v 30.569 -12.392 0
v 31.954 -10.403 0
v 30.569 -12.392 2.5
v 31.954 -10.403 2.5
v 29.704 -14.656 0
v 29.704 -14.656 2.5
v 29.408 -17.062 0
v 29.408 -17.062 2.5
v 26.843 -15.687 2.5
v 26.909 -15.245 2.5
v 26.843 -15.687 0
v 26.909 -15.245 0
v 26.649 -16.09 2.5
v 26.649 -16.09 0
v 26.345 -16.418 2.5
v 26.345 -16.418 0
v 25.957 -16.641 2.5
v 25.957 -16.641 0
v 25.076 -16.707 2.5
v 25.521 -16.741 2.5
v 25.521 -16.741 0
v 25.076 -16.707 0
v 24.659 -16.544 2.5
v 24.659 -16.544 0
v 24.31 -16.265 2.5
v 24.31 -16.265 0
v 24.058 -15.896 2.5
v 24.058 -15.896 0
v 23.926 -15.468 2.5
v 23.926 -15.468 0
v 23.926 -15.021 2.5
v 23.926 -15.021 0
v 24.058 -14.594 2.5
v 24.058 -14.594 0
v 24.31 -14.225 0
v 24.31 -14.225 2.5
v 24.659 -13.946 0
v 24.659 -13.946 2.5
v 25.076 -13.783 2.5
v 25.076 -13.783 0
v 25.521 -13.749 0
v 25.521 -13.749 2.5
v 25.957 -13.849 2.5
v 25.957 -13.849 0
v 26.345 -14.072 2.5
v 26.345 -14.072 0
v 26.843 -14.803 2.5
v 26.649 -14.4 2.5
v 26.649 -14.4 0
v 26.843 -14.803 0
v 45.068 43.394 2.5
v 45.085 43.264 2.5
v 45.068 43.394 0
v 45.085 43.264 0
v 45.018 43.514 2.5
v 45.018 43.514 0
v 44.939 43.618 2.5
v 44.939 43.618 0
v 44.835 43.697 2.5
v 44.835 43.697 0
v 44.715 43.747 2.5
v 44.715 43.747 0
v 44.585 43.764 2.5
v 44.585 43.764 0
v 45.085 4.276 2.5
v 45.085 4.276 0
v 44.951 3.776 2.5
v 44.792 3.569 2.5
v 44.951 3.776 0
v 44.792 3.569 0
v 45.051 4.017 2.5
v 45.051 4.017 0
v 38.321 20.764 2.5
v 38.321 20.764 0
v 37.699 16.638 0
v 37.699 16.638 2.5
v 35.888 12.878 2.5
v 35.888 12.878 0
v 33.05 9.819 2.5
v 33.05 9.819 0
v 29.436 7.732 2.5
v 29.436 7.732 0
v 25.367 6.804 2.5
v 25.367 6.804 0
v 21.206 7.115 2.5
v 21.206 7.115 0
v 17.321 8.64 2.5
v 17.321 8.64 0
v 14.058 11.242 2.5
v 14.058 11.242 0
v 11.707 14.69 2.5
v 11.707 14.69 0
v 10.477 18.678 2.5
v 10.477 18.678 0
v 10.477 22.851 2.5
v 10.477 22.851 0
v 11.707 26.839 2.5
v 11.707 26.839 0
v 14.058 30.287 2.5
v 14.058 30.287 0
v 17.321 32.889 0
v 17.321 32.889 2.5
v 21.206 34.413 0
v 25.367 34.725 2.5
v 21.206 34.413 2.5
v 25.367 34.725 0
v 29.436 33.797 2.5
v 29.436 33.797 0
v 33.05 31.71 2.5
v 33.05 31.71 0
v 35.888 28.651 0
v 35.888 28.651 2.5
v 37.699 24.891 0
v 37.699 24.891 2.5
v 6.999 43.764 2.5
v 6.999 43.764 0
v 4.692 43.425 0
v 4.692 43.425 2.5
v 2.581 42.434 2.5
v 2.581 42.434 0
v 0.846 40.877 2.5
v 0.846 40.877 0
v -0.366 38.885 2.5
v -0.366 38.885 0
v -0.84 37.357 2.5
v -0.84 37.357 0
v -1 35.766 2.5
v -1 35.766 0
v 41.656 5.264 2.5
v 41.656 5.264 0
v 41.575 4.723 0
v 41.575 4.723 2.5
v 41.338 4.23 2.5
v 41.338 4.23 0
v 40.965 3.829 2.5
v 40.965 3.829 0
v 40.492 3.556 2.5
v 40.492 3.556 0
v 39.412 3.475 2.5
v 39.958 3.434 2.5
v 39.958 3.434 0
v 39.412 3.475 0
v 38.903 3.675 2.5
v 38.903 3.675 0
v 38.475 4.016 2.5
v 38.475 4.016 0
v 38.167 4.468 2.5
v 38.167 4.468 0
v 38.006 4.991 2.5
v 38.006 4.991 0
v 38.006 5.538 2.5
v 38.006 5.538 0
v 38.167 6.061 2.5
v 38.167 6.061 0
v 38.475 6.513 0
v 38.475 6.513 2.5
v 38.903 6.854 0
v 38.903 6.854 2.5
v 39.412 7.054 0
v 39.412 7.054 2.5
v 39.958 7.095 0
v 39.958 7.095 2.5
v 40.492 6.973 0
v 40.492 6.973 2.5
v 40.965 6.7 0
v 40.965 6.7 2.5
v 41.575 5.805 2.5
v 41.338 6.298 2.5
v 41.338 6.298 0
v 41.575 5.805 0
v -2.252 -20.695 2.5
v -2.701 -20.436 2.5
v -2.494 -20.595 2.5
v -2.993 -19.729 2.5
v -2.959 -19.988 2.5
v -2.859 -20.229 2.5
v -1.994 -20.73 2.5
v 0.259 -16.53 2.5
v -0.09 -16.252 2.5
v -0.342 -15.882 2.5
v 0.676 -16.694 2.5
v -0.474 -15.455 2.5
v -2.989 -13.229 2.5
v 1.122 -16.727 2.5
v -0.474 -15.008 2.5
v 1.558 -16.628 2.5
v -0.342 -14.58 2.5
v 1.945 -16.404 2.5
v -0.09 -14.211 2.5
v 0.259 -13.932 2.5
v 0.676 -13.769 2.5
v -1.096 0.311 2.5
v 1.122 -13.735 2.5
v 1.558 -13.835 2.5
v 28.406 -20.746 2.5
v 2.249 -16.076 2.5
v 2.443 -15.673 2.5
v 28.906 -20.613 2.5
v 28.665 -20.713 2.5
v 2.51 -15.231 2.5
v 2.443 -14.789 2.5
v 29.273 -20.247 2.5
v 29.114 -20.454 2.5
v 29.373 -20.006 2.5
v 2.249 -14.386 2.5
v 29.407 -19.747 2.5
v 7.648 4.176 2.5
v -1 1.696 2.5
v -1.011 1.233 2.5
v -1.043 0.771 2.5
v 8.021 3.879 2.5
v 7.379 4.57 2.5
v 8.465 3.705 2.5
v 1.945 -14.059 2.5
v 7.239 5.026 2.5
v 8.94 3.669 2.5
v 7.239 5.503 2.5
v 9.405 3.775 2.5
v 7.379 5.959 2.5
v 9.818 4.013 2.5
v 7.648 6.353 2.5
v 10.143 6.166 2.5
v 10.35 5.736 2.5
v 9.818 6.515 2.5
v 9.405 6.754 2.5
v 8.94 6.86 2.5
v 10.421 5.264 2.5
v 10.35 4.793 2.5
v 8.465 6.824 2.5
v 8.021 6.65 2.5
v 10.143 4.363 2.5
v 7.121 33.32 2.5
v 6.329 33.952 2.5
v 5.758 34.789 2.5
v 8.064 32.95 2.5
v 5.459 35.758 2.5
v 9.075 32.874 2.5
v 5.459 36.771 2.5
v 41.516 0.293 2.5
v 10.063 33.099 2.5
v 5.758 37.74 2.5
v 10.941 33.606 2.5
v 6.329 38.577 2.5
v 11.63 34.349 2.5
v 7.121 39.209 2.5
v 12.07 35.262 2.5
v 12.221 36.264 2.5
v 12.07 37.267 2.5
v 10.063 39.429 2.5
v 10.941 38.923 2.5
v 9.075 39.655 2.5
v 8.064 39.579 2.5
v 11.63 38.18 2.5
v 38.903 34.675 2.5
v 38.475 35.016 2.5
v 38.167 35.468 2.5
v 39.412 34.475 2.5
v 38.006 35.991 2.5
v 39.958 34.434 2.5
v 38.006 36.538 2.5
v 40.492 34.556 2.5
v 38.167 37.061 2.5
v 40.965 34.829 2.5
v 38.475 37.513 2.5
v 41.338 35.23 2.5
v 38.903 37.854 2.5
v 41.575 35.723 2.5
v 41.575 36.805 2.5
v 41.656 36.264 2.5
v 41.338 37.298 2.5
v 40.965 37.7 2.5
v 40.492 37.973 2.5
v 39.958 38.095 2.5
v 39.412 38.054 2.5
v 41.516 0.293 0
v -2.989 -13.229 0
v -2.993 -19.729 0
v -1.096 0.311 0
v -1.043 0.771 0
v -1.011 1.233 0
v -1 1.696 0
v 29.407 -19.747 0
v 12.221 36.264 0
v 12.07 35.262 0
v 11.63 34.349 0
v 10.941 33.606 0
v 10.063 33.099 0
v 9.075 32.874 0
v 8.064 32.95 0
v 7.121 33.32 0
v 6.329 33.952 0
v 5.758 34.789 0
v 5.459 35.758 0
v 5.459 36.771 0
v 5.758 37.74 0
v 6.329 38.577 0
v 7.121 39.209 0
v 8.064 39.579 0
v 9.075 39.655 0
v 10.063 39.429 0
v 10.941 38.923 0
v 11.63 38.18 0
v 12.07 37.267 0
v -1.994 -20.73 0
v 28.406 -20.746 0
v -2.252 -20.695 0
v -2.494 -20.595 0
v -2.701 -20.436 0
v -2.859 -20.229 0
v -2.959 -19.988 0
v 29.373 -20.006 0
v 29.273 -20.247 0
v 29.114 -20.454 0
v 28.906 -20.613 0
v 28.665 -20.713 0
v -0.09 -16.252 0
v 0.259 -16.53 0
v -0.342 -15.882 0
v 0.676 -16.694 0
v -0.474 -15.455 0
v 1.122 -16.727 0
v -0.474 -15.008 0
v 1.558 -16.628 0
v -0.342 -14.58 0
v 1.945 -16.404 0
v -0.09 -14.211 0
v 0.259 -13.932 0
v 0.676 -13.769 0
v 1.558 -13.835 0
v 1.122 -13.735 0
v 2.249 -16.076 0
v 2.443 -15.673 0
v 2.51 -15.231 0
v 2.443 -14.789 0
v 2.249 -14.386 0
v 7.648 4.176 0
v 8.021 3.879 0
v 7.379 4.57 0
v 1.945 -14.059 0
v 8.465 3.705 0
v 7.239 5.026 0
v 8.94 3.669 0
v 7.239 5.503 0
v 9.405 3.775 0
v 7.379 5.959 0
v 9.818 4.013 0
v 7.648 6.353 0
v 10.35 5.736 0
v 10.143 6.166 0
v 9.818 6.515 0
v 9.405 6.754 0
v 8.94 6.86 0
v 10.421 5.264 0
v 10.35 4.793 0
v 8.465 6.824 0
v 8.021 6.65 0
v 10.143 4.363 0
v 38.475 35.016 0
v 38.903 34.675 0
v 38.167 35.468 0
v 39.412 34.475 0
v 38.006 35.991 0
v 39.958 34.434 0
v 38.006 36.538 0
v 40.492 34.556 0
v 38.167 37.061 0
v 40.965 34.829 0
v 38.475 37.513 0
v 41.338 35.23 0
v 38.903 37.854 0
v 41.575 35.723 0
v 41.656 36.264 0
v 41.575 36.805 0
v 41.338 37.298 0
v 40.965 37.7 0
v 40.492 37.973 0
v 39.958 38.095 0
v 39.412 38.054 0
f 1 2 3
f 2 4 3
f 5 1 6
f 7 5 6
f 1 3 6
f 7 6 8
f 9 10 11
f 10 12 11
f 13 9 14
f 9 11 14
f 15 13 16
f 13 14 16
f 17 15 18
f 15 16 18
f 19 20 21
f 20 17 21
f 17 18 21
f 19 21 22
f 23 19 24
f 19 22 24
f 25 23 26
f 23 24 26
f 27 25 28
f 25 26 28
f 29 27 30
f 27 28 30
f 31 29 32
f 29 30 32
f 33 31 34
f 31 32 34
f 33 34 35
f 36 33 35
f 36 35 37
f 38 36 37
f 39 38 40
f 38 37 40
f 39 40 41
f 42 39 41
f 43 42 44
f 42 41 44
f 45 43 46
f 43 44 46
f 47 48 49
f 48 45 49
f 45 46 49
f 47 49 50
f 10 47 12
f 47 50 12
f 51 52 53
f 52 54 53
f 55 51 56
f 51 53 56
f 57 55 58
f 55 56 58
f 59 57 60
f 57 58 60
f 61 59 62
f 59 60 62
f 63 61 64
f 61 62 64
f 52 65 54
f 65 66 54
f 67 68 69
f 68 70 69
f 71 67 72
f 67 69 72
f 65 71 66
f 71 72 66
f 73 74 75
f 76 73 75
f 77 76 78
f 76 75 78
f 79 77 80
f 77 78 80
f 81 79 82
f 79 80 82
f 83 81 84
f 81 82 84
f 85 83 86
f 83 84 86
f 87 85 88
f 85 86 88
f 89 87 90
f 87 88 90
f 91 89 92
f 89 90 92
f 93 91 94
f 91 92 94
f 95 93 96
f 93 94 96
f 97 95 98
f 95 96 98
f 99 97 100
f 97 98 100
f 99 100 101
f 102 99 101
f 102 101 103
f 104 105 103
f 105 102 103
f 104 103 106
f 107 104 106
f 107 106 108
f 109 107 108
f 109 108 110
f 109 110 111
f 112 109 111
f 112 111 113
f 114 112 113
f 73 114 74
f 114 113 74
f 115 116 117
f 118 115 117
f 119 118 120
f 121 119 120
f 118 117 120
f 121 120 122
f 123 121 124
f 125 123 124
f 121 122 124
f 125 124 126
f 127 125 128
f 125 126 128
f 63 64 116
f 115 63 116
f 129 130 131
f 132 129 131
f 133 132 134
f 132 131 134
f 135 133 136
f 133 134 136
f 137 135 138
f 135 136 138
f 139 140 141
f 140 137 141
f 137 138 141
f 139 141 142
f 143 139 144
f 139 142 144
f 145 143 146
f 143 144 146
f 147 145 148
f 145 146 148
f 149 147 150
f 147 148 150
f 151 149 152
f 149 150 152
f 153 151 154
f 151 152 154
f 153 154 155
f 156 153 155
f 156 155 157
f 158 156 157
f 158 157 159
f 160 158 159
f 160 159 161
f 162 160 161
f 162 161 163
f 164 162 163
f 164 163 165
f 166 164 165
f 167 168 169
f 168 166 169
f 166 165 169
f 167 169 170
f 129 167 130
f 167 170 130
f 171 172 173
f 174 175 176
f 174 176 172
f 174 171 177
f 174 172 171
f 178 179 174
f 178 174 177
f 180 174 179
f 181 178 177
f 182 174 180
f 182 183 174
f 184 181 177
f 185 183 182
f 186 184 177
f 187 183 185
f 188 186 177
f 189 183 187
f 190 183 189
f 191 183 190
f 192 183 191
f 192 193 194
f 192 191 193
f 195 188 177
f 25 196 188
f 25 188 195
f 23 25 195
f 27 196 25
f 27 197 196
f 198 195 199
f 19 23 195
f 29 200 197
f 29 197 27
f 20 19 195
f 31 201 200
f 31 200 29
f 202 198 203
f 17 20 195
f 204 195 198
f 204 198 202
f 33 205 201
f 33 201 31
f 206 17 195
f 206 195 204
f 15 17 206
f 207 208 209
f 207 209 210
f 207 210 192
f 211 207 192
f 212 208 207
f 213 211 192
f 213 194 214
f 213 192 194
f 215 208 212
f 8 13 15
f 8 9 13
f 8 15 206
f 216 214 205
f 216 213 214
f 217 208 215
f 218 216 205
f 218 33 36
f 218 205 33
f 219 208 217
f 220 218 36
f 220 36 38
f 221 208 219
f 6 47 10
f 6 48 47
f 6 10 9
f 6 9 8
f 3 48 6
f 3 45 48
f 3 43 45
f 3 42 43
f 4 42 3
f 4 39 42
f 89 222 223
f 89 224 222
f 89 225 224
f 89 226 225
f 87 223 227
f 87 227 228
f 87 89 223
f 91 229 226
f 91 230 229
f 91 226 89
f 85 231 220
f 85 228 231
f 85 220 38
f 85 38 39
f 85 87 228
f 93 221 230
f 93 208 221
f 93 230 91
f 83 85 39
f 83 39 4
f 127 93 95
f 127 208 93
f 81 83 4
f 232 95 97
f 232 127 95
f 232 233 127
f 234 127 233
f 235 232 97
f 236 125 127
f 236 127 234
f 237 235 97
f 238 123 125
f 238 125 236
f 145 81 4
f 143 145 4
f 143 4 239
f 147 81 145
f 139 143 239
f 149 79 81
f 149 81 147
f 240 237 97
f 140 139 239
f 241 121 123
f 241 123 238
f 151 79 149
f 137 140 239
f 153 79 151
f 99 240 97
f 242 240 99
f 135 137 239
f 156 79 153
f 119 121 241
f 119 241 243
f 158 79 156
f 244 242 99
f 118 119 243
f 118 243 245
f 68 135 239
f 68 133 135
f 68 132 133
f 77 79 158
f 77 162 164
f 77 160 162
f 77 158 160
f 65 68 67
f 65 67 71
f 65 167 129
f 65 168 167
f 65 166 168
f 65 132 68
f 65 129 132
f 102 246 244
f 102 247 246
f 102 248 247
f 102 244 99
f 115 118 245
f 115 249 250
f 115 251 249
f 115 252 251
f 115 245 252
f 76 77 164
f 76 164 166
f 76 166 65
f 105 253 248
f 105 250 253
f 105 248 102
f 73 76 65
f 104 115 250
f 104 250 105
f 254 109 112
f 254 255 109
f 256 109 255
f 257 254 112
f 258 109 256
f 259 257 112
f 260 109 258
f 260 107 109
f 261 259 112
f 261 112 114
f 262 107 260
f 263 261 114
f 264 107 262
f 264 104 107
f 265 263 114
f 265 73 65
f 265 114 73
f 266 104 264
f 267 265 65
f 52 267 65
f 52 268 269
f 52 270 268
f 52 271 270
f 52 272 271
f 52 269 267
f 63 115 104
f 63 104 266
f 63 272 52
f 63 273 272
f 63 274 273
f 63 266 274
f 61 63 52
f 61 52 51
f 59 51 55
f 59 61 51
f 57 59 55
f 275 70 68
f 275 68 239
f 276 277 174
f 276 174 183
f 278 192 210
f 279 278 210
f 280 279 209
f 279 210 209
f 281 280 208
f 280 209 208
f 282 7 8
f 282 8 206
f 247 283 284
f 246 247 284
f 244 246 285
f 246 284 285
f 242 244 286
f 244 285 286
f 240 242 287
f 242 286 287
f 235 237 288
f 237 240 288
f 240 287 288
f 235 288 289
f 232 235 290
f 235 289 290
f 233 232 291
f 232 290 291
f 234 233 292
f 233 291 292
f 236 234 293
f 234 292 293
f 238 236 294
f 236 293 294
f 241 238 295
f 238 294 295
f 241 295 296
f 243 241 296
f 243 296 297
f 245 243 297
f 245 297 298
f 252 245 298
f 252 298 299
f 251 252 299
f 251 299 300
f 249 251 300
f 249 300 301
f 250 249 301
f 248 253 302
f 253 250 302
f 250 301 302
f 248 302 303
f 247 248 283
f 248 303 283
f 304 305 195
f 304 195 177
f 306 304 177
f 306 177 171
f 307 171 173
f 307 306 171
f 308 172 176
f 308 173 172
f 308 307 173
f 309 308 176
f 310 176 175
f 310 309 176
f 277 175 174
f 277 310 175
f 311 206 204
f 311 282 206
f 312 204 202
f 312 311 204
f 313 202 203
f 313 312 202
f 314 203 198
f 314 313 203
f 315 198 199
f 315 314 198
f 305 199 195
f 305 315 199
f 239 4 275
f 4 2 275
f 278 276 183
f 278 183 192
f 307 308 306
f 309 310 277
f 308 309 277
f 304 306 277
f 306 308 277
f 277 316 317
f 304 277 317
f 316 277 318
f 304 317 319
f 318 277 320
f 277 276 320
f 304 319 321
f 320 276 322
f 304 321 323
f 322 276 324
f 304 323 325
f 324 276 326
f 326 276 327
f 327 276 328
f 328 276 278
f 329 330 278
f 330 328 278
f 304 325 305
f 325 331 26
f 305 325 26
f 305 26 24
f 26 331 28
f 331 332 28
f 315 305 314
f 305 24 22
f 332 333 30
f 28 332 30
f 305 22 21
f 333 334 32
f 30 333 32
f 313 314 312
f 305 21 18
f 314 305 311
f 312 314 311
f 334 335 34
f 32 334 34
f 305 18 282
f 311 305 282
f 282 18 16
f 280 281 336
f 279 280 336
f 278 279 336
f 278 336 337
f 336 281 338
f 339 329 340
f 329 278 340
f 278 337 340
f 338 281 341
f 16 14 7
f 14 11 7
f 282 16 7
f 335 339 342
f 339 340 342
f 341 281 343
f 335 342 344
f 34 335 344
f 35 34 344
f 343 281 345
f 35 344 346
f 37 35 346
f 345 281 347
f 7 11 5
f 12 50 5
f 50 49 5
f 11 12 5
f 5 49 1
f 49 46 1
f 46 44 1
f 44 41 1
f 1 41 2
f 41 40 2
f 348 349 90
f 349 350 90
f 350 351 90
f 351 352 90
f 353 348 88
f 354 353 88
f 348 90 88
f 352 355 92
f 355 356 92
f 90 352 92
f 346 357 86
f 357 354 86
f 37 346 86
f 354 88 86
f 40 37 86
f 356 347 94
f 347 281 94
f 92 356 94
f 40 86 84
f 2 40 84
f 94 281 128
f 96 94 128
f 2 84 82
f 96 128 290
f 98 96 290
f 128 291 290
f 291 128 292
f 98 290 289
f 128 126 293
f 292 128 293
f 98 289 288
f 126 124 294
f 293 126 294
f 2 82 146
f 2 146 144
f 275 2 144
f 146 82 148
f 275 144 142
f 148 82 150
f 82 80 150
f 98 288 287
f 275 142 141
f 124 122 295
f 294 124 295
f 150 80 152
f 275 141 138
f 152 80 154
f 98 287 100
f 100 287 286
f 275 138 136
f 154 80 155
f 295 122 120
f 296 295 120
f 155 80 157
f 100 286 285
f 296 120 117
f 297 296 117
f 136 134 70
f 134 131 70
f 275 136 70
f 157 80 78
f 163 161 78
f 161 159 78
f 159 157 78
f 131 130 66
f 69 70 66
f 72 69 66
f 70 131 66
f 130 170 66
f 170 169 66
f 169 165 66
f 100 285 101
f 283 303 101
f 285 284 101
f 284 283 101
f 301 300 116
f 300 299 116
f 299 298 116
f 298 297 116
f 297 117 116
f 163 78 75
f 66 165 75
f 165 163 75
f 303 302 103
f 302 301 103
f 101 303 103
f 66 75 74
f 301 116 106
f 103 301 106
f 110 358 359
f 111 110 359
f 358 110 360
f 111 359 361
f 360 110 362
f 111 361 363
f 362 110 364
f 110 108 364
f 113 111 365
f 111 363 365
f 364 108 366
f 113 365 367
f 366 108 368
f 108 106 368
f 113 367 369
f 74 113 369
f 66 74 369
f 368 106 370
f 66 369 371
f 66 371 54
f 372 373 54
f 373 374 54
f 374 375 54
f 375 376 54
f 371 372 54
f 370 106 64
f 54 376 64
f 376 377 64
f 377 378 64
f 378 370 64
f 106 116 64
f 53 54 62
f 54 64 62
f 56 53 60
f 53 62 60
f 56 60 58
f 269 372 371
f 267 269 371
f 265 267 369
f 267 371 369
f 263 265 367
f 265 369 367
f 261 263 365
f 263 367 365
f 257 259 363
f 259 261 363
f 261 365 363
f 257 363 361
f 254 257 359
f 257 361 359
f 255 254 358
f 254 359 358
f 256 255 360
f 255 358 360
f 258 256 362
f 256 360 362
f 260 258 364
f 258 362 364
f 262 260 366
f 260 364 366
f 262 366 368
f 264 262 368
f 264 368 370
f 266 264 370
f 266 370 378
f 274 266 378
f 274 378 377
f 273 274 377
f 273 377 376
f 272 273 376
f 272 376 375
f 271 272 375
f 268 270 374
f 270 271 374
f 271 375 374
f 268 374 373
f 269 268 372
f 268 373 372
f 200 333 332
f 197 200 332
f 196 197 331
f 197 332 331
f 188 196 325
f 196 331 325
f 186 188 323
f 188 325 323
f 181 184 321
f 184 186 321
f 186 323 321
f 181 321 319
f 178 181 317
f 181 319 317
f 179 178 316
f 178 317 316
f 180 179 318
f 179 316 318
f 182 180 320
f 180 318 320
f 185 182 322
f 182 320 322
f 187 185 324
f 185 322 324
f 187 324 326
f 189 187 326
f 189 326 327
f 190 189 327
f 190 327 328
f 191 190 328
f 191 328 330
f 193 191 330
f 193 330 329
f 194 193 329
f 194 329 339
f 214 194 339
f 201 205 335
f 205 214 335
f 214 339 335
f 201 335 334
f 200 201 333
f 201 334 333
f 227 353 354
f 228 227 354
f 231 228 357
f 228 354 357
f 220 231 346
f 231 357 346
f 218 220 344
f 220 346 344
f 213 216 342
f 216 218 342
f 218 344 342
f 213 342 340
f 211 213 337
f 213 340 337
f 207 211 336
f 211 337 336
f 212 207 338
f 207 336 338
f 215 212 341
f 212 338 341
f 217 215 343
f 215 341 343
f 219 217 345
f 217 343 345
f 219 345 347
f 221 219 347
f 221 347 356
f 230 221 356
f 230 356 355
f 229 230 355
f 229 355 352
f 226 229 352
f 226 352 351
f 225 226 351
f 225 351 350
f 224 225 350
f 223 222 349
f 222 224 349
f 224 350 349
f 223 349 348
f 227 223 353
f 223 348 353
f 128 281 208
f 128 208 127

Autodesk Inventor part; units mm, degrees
ref_plane "YZ Plane" through (0, 0, 0) normal (1, 0, 0) x (0, 1, 0)
ref_plane "XZ Plane" through (0, 0, 0) normal (0, 1, 0) x (-1, 0, 0)
ref_plane "XY Plane" through (0, 0, 0) normal (0, 0, 1) x (1, 0, 0)
sketch "Szkic1" plane through (0, 0, 0) normal (0, 0, 1) x (1, 0, 0)
  line L0 (-0.9998, 0.9998) -> (-0.9998, 4.2541)
  ellipse E0 centre (0.0003, 1.0002) end of major axis (-0.707, 0.2928) minor radius 1 (-0.9998, 0.9998) -> (0, 0) ccw
  line L1 (0, 0) -> (40.8091, 0)
  ellipse E1 centre (40.809, 1.0002) end of major axis (41.1917, 0.0761) minor radius 1 (40.8091, 0) -> (41.5161, 0.2928) ccw
  line L2 (44.7924, 3.5691) -> (41.5161, 0.2928)
  ellipse E2 centre (44.0851, 4.2762) end of major axis (45.0091, 3.8935) minor radius 1 (44.7924, 3.5691) -> (45.0852, 4.2761) ccw
  line L3 (45.0852, 4.2761) -> (45.0852, 43.2644)
  ellipse E3 centre (44.5851, 43.2643) end of major axis (44.9388, 43.6179) minor radius 0.5 (45.0852, 43.2644) -> (44.5853, 43.7644) ccw
  line L4 (44.5853, 43.7644) -> (6.9989, 43.7644)
  ellipse E4 centre (7.0014, 35.7631) end of major axis (1.3428, 41.4217) minor radius 8 (6.9989, 43.7644) -> (-0.9998, 35.7656) ccw
  line L5 (-0.9998, 7.3746) -> (-0.9998, 35.7656)
  circle A0 centre (24.3209, 20.7644) radius 14
  circle A1 centre (8.8209, 36.2644) radius 3.4
  circle A2 centre (39.8209, 36.2644) radius 1.8356
  circle A3 centre (39.8209, 5.2644) radius 1.8356
  circle A4 centre (8.8209, 5.2644) radius 1.6
  line L6 (-0.9998, 7.3746) -> (-0.9998, 4.2541)
  circle A5 centre (25.4094, -15.2449) radius 1.5
  circle A6 centre (1.0095, -15.2313) radius 1.5
  arc A7 (28.4064, -20.7465) -> (29.4069, -19.7471) centre (28.4069, -19.7465) ccw
  line L7 (29.4106, -13.2471) -> (29.4069, -19.7471)
  line L8 (27.9114, -11.7463) -> (29.4106, -13.2471)
  line L9 (-1.4886, -11.7299) -> (27.9114, -11.7463)
  line L10 (-2.9894, -13.2291) -> (-1.4886, -11.7299)
  line L11 (-2.9931, -19.7291) -> (-2.9894, -13.2291)
  arc A8 (-2.9931, -19.7291) -> (-1.9936, -20.7296) centre (-1.9931, -19.7296) ccw
  line L12 (28.4064, -20.7465) -> (-1.9936, -20.7296)
  line L13 (-2.9894, -13.2291) -> (-0.9998, 0.9998)
  line L14 (29.4106, -13.2471) -> (41.5161, 0.2928)
  point P0 (0, 0)
  point P1 (0, 0)
  dimension "d15" = 0.5001
  dimension "d16" = 1.0002
  dimension "d17" = 1.0002
  dimension "d18" = 8.0024
  dimension "d19" = 1.0003
  dimension "d20" = 0.5
  dimension "d21" = 1
  dimension "d22" = 1
  dimension "d23" = 8
  dimension "d24" = 1
  dimension "d0" = 32.4
  dimension "d1" = 9
  dimension "d2" = 3.5
  dimension "d3" = 3.5
  dimension "d4" = 4
  dimension "d5" = 4
  dimension "d6" = 1
  dimension "d7" = 3
  dimension "d8" = 135
  dimension "d9" = 4.5962
  dimension "d10" = 27.5065
  dimension "d11" = 3.6713
  dimension "d12" = 28
  dimension "d13" = 6.8
  dimension "d14" = 3.2
  dimension "d25" = 135
  dimension "d26" = 46.0851
  dimension "d27" = 43.7644
  dimension "d28" = 45.0852
  dimension "d29" = 29.1492
  dimension "d30" = 43.7644
  dimension "d31" = 4.2761
  dimension "d32" = 3.5691
  dimension "d33" = 5.2644
  dimension "d34" = 26.6344
  dimension "d35" = 5.2644
  dimension "d36" = 4.7141
  dimension "d37" = 20.7644
  dimension "d38" = 26.6344
  dimension "d39" = 20.7644
  dimension "d40" = 26.6344
  dimension "d41" = 36.2644
  dimension "d42" = 48.5547
  dimension "d43" = 36.2644
  dimension "d44" = 26.6344
  dimension "d45" = 45.0852
  dimension "d46" = 29.1492
  dimension "d47" = 35.0709
  dimension "d48" = 32.8644
  dimension "d55" = 11.8
  dimension "d56" = 17
extrude "Wyciągnięcie proste1" add sketch "Szkic1" along normal blind 2.5
fillet "Zaokrąglenie1" radius 10 3 edges at (-2.9931, -19.7291, 1.25) (-0.9998, 0.9998, 1.25) (29.4106, -13.2471, 1.25)
properties part number "3DP_ABS_E3D_Titan_Mounting_Plate"
